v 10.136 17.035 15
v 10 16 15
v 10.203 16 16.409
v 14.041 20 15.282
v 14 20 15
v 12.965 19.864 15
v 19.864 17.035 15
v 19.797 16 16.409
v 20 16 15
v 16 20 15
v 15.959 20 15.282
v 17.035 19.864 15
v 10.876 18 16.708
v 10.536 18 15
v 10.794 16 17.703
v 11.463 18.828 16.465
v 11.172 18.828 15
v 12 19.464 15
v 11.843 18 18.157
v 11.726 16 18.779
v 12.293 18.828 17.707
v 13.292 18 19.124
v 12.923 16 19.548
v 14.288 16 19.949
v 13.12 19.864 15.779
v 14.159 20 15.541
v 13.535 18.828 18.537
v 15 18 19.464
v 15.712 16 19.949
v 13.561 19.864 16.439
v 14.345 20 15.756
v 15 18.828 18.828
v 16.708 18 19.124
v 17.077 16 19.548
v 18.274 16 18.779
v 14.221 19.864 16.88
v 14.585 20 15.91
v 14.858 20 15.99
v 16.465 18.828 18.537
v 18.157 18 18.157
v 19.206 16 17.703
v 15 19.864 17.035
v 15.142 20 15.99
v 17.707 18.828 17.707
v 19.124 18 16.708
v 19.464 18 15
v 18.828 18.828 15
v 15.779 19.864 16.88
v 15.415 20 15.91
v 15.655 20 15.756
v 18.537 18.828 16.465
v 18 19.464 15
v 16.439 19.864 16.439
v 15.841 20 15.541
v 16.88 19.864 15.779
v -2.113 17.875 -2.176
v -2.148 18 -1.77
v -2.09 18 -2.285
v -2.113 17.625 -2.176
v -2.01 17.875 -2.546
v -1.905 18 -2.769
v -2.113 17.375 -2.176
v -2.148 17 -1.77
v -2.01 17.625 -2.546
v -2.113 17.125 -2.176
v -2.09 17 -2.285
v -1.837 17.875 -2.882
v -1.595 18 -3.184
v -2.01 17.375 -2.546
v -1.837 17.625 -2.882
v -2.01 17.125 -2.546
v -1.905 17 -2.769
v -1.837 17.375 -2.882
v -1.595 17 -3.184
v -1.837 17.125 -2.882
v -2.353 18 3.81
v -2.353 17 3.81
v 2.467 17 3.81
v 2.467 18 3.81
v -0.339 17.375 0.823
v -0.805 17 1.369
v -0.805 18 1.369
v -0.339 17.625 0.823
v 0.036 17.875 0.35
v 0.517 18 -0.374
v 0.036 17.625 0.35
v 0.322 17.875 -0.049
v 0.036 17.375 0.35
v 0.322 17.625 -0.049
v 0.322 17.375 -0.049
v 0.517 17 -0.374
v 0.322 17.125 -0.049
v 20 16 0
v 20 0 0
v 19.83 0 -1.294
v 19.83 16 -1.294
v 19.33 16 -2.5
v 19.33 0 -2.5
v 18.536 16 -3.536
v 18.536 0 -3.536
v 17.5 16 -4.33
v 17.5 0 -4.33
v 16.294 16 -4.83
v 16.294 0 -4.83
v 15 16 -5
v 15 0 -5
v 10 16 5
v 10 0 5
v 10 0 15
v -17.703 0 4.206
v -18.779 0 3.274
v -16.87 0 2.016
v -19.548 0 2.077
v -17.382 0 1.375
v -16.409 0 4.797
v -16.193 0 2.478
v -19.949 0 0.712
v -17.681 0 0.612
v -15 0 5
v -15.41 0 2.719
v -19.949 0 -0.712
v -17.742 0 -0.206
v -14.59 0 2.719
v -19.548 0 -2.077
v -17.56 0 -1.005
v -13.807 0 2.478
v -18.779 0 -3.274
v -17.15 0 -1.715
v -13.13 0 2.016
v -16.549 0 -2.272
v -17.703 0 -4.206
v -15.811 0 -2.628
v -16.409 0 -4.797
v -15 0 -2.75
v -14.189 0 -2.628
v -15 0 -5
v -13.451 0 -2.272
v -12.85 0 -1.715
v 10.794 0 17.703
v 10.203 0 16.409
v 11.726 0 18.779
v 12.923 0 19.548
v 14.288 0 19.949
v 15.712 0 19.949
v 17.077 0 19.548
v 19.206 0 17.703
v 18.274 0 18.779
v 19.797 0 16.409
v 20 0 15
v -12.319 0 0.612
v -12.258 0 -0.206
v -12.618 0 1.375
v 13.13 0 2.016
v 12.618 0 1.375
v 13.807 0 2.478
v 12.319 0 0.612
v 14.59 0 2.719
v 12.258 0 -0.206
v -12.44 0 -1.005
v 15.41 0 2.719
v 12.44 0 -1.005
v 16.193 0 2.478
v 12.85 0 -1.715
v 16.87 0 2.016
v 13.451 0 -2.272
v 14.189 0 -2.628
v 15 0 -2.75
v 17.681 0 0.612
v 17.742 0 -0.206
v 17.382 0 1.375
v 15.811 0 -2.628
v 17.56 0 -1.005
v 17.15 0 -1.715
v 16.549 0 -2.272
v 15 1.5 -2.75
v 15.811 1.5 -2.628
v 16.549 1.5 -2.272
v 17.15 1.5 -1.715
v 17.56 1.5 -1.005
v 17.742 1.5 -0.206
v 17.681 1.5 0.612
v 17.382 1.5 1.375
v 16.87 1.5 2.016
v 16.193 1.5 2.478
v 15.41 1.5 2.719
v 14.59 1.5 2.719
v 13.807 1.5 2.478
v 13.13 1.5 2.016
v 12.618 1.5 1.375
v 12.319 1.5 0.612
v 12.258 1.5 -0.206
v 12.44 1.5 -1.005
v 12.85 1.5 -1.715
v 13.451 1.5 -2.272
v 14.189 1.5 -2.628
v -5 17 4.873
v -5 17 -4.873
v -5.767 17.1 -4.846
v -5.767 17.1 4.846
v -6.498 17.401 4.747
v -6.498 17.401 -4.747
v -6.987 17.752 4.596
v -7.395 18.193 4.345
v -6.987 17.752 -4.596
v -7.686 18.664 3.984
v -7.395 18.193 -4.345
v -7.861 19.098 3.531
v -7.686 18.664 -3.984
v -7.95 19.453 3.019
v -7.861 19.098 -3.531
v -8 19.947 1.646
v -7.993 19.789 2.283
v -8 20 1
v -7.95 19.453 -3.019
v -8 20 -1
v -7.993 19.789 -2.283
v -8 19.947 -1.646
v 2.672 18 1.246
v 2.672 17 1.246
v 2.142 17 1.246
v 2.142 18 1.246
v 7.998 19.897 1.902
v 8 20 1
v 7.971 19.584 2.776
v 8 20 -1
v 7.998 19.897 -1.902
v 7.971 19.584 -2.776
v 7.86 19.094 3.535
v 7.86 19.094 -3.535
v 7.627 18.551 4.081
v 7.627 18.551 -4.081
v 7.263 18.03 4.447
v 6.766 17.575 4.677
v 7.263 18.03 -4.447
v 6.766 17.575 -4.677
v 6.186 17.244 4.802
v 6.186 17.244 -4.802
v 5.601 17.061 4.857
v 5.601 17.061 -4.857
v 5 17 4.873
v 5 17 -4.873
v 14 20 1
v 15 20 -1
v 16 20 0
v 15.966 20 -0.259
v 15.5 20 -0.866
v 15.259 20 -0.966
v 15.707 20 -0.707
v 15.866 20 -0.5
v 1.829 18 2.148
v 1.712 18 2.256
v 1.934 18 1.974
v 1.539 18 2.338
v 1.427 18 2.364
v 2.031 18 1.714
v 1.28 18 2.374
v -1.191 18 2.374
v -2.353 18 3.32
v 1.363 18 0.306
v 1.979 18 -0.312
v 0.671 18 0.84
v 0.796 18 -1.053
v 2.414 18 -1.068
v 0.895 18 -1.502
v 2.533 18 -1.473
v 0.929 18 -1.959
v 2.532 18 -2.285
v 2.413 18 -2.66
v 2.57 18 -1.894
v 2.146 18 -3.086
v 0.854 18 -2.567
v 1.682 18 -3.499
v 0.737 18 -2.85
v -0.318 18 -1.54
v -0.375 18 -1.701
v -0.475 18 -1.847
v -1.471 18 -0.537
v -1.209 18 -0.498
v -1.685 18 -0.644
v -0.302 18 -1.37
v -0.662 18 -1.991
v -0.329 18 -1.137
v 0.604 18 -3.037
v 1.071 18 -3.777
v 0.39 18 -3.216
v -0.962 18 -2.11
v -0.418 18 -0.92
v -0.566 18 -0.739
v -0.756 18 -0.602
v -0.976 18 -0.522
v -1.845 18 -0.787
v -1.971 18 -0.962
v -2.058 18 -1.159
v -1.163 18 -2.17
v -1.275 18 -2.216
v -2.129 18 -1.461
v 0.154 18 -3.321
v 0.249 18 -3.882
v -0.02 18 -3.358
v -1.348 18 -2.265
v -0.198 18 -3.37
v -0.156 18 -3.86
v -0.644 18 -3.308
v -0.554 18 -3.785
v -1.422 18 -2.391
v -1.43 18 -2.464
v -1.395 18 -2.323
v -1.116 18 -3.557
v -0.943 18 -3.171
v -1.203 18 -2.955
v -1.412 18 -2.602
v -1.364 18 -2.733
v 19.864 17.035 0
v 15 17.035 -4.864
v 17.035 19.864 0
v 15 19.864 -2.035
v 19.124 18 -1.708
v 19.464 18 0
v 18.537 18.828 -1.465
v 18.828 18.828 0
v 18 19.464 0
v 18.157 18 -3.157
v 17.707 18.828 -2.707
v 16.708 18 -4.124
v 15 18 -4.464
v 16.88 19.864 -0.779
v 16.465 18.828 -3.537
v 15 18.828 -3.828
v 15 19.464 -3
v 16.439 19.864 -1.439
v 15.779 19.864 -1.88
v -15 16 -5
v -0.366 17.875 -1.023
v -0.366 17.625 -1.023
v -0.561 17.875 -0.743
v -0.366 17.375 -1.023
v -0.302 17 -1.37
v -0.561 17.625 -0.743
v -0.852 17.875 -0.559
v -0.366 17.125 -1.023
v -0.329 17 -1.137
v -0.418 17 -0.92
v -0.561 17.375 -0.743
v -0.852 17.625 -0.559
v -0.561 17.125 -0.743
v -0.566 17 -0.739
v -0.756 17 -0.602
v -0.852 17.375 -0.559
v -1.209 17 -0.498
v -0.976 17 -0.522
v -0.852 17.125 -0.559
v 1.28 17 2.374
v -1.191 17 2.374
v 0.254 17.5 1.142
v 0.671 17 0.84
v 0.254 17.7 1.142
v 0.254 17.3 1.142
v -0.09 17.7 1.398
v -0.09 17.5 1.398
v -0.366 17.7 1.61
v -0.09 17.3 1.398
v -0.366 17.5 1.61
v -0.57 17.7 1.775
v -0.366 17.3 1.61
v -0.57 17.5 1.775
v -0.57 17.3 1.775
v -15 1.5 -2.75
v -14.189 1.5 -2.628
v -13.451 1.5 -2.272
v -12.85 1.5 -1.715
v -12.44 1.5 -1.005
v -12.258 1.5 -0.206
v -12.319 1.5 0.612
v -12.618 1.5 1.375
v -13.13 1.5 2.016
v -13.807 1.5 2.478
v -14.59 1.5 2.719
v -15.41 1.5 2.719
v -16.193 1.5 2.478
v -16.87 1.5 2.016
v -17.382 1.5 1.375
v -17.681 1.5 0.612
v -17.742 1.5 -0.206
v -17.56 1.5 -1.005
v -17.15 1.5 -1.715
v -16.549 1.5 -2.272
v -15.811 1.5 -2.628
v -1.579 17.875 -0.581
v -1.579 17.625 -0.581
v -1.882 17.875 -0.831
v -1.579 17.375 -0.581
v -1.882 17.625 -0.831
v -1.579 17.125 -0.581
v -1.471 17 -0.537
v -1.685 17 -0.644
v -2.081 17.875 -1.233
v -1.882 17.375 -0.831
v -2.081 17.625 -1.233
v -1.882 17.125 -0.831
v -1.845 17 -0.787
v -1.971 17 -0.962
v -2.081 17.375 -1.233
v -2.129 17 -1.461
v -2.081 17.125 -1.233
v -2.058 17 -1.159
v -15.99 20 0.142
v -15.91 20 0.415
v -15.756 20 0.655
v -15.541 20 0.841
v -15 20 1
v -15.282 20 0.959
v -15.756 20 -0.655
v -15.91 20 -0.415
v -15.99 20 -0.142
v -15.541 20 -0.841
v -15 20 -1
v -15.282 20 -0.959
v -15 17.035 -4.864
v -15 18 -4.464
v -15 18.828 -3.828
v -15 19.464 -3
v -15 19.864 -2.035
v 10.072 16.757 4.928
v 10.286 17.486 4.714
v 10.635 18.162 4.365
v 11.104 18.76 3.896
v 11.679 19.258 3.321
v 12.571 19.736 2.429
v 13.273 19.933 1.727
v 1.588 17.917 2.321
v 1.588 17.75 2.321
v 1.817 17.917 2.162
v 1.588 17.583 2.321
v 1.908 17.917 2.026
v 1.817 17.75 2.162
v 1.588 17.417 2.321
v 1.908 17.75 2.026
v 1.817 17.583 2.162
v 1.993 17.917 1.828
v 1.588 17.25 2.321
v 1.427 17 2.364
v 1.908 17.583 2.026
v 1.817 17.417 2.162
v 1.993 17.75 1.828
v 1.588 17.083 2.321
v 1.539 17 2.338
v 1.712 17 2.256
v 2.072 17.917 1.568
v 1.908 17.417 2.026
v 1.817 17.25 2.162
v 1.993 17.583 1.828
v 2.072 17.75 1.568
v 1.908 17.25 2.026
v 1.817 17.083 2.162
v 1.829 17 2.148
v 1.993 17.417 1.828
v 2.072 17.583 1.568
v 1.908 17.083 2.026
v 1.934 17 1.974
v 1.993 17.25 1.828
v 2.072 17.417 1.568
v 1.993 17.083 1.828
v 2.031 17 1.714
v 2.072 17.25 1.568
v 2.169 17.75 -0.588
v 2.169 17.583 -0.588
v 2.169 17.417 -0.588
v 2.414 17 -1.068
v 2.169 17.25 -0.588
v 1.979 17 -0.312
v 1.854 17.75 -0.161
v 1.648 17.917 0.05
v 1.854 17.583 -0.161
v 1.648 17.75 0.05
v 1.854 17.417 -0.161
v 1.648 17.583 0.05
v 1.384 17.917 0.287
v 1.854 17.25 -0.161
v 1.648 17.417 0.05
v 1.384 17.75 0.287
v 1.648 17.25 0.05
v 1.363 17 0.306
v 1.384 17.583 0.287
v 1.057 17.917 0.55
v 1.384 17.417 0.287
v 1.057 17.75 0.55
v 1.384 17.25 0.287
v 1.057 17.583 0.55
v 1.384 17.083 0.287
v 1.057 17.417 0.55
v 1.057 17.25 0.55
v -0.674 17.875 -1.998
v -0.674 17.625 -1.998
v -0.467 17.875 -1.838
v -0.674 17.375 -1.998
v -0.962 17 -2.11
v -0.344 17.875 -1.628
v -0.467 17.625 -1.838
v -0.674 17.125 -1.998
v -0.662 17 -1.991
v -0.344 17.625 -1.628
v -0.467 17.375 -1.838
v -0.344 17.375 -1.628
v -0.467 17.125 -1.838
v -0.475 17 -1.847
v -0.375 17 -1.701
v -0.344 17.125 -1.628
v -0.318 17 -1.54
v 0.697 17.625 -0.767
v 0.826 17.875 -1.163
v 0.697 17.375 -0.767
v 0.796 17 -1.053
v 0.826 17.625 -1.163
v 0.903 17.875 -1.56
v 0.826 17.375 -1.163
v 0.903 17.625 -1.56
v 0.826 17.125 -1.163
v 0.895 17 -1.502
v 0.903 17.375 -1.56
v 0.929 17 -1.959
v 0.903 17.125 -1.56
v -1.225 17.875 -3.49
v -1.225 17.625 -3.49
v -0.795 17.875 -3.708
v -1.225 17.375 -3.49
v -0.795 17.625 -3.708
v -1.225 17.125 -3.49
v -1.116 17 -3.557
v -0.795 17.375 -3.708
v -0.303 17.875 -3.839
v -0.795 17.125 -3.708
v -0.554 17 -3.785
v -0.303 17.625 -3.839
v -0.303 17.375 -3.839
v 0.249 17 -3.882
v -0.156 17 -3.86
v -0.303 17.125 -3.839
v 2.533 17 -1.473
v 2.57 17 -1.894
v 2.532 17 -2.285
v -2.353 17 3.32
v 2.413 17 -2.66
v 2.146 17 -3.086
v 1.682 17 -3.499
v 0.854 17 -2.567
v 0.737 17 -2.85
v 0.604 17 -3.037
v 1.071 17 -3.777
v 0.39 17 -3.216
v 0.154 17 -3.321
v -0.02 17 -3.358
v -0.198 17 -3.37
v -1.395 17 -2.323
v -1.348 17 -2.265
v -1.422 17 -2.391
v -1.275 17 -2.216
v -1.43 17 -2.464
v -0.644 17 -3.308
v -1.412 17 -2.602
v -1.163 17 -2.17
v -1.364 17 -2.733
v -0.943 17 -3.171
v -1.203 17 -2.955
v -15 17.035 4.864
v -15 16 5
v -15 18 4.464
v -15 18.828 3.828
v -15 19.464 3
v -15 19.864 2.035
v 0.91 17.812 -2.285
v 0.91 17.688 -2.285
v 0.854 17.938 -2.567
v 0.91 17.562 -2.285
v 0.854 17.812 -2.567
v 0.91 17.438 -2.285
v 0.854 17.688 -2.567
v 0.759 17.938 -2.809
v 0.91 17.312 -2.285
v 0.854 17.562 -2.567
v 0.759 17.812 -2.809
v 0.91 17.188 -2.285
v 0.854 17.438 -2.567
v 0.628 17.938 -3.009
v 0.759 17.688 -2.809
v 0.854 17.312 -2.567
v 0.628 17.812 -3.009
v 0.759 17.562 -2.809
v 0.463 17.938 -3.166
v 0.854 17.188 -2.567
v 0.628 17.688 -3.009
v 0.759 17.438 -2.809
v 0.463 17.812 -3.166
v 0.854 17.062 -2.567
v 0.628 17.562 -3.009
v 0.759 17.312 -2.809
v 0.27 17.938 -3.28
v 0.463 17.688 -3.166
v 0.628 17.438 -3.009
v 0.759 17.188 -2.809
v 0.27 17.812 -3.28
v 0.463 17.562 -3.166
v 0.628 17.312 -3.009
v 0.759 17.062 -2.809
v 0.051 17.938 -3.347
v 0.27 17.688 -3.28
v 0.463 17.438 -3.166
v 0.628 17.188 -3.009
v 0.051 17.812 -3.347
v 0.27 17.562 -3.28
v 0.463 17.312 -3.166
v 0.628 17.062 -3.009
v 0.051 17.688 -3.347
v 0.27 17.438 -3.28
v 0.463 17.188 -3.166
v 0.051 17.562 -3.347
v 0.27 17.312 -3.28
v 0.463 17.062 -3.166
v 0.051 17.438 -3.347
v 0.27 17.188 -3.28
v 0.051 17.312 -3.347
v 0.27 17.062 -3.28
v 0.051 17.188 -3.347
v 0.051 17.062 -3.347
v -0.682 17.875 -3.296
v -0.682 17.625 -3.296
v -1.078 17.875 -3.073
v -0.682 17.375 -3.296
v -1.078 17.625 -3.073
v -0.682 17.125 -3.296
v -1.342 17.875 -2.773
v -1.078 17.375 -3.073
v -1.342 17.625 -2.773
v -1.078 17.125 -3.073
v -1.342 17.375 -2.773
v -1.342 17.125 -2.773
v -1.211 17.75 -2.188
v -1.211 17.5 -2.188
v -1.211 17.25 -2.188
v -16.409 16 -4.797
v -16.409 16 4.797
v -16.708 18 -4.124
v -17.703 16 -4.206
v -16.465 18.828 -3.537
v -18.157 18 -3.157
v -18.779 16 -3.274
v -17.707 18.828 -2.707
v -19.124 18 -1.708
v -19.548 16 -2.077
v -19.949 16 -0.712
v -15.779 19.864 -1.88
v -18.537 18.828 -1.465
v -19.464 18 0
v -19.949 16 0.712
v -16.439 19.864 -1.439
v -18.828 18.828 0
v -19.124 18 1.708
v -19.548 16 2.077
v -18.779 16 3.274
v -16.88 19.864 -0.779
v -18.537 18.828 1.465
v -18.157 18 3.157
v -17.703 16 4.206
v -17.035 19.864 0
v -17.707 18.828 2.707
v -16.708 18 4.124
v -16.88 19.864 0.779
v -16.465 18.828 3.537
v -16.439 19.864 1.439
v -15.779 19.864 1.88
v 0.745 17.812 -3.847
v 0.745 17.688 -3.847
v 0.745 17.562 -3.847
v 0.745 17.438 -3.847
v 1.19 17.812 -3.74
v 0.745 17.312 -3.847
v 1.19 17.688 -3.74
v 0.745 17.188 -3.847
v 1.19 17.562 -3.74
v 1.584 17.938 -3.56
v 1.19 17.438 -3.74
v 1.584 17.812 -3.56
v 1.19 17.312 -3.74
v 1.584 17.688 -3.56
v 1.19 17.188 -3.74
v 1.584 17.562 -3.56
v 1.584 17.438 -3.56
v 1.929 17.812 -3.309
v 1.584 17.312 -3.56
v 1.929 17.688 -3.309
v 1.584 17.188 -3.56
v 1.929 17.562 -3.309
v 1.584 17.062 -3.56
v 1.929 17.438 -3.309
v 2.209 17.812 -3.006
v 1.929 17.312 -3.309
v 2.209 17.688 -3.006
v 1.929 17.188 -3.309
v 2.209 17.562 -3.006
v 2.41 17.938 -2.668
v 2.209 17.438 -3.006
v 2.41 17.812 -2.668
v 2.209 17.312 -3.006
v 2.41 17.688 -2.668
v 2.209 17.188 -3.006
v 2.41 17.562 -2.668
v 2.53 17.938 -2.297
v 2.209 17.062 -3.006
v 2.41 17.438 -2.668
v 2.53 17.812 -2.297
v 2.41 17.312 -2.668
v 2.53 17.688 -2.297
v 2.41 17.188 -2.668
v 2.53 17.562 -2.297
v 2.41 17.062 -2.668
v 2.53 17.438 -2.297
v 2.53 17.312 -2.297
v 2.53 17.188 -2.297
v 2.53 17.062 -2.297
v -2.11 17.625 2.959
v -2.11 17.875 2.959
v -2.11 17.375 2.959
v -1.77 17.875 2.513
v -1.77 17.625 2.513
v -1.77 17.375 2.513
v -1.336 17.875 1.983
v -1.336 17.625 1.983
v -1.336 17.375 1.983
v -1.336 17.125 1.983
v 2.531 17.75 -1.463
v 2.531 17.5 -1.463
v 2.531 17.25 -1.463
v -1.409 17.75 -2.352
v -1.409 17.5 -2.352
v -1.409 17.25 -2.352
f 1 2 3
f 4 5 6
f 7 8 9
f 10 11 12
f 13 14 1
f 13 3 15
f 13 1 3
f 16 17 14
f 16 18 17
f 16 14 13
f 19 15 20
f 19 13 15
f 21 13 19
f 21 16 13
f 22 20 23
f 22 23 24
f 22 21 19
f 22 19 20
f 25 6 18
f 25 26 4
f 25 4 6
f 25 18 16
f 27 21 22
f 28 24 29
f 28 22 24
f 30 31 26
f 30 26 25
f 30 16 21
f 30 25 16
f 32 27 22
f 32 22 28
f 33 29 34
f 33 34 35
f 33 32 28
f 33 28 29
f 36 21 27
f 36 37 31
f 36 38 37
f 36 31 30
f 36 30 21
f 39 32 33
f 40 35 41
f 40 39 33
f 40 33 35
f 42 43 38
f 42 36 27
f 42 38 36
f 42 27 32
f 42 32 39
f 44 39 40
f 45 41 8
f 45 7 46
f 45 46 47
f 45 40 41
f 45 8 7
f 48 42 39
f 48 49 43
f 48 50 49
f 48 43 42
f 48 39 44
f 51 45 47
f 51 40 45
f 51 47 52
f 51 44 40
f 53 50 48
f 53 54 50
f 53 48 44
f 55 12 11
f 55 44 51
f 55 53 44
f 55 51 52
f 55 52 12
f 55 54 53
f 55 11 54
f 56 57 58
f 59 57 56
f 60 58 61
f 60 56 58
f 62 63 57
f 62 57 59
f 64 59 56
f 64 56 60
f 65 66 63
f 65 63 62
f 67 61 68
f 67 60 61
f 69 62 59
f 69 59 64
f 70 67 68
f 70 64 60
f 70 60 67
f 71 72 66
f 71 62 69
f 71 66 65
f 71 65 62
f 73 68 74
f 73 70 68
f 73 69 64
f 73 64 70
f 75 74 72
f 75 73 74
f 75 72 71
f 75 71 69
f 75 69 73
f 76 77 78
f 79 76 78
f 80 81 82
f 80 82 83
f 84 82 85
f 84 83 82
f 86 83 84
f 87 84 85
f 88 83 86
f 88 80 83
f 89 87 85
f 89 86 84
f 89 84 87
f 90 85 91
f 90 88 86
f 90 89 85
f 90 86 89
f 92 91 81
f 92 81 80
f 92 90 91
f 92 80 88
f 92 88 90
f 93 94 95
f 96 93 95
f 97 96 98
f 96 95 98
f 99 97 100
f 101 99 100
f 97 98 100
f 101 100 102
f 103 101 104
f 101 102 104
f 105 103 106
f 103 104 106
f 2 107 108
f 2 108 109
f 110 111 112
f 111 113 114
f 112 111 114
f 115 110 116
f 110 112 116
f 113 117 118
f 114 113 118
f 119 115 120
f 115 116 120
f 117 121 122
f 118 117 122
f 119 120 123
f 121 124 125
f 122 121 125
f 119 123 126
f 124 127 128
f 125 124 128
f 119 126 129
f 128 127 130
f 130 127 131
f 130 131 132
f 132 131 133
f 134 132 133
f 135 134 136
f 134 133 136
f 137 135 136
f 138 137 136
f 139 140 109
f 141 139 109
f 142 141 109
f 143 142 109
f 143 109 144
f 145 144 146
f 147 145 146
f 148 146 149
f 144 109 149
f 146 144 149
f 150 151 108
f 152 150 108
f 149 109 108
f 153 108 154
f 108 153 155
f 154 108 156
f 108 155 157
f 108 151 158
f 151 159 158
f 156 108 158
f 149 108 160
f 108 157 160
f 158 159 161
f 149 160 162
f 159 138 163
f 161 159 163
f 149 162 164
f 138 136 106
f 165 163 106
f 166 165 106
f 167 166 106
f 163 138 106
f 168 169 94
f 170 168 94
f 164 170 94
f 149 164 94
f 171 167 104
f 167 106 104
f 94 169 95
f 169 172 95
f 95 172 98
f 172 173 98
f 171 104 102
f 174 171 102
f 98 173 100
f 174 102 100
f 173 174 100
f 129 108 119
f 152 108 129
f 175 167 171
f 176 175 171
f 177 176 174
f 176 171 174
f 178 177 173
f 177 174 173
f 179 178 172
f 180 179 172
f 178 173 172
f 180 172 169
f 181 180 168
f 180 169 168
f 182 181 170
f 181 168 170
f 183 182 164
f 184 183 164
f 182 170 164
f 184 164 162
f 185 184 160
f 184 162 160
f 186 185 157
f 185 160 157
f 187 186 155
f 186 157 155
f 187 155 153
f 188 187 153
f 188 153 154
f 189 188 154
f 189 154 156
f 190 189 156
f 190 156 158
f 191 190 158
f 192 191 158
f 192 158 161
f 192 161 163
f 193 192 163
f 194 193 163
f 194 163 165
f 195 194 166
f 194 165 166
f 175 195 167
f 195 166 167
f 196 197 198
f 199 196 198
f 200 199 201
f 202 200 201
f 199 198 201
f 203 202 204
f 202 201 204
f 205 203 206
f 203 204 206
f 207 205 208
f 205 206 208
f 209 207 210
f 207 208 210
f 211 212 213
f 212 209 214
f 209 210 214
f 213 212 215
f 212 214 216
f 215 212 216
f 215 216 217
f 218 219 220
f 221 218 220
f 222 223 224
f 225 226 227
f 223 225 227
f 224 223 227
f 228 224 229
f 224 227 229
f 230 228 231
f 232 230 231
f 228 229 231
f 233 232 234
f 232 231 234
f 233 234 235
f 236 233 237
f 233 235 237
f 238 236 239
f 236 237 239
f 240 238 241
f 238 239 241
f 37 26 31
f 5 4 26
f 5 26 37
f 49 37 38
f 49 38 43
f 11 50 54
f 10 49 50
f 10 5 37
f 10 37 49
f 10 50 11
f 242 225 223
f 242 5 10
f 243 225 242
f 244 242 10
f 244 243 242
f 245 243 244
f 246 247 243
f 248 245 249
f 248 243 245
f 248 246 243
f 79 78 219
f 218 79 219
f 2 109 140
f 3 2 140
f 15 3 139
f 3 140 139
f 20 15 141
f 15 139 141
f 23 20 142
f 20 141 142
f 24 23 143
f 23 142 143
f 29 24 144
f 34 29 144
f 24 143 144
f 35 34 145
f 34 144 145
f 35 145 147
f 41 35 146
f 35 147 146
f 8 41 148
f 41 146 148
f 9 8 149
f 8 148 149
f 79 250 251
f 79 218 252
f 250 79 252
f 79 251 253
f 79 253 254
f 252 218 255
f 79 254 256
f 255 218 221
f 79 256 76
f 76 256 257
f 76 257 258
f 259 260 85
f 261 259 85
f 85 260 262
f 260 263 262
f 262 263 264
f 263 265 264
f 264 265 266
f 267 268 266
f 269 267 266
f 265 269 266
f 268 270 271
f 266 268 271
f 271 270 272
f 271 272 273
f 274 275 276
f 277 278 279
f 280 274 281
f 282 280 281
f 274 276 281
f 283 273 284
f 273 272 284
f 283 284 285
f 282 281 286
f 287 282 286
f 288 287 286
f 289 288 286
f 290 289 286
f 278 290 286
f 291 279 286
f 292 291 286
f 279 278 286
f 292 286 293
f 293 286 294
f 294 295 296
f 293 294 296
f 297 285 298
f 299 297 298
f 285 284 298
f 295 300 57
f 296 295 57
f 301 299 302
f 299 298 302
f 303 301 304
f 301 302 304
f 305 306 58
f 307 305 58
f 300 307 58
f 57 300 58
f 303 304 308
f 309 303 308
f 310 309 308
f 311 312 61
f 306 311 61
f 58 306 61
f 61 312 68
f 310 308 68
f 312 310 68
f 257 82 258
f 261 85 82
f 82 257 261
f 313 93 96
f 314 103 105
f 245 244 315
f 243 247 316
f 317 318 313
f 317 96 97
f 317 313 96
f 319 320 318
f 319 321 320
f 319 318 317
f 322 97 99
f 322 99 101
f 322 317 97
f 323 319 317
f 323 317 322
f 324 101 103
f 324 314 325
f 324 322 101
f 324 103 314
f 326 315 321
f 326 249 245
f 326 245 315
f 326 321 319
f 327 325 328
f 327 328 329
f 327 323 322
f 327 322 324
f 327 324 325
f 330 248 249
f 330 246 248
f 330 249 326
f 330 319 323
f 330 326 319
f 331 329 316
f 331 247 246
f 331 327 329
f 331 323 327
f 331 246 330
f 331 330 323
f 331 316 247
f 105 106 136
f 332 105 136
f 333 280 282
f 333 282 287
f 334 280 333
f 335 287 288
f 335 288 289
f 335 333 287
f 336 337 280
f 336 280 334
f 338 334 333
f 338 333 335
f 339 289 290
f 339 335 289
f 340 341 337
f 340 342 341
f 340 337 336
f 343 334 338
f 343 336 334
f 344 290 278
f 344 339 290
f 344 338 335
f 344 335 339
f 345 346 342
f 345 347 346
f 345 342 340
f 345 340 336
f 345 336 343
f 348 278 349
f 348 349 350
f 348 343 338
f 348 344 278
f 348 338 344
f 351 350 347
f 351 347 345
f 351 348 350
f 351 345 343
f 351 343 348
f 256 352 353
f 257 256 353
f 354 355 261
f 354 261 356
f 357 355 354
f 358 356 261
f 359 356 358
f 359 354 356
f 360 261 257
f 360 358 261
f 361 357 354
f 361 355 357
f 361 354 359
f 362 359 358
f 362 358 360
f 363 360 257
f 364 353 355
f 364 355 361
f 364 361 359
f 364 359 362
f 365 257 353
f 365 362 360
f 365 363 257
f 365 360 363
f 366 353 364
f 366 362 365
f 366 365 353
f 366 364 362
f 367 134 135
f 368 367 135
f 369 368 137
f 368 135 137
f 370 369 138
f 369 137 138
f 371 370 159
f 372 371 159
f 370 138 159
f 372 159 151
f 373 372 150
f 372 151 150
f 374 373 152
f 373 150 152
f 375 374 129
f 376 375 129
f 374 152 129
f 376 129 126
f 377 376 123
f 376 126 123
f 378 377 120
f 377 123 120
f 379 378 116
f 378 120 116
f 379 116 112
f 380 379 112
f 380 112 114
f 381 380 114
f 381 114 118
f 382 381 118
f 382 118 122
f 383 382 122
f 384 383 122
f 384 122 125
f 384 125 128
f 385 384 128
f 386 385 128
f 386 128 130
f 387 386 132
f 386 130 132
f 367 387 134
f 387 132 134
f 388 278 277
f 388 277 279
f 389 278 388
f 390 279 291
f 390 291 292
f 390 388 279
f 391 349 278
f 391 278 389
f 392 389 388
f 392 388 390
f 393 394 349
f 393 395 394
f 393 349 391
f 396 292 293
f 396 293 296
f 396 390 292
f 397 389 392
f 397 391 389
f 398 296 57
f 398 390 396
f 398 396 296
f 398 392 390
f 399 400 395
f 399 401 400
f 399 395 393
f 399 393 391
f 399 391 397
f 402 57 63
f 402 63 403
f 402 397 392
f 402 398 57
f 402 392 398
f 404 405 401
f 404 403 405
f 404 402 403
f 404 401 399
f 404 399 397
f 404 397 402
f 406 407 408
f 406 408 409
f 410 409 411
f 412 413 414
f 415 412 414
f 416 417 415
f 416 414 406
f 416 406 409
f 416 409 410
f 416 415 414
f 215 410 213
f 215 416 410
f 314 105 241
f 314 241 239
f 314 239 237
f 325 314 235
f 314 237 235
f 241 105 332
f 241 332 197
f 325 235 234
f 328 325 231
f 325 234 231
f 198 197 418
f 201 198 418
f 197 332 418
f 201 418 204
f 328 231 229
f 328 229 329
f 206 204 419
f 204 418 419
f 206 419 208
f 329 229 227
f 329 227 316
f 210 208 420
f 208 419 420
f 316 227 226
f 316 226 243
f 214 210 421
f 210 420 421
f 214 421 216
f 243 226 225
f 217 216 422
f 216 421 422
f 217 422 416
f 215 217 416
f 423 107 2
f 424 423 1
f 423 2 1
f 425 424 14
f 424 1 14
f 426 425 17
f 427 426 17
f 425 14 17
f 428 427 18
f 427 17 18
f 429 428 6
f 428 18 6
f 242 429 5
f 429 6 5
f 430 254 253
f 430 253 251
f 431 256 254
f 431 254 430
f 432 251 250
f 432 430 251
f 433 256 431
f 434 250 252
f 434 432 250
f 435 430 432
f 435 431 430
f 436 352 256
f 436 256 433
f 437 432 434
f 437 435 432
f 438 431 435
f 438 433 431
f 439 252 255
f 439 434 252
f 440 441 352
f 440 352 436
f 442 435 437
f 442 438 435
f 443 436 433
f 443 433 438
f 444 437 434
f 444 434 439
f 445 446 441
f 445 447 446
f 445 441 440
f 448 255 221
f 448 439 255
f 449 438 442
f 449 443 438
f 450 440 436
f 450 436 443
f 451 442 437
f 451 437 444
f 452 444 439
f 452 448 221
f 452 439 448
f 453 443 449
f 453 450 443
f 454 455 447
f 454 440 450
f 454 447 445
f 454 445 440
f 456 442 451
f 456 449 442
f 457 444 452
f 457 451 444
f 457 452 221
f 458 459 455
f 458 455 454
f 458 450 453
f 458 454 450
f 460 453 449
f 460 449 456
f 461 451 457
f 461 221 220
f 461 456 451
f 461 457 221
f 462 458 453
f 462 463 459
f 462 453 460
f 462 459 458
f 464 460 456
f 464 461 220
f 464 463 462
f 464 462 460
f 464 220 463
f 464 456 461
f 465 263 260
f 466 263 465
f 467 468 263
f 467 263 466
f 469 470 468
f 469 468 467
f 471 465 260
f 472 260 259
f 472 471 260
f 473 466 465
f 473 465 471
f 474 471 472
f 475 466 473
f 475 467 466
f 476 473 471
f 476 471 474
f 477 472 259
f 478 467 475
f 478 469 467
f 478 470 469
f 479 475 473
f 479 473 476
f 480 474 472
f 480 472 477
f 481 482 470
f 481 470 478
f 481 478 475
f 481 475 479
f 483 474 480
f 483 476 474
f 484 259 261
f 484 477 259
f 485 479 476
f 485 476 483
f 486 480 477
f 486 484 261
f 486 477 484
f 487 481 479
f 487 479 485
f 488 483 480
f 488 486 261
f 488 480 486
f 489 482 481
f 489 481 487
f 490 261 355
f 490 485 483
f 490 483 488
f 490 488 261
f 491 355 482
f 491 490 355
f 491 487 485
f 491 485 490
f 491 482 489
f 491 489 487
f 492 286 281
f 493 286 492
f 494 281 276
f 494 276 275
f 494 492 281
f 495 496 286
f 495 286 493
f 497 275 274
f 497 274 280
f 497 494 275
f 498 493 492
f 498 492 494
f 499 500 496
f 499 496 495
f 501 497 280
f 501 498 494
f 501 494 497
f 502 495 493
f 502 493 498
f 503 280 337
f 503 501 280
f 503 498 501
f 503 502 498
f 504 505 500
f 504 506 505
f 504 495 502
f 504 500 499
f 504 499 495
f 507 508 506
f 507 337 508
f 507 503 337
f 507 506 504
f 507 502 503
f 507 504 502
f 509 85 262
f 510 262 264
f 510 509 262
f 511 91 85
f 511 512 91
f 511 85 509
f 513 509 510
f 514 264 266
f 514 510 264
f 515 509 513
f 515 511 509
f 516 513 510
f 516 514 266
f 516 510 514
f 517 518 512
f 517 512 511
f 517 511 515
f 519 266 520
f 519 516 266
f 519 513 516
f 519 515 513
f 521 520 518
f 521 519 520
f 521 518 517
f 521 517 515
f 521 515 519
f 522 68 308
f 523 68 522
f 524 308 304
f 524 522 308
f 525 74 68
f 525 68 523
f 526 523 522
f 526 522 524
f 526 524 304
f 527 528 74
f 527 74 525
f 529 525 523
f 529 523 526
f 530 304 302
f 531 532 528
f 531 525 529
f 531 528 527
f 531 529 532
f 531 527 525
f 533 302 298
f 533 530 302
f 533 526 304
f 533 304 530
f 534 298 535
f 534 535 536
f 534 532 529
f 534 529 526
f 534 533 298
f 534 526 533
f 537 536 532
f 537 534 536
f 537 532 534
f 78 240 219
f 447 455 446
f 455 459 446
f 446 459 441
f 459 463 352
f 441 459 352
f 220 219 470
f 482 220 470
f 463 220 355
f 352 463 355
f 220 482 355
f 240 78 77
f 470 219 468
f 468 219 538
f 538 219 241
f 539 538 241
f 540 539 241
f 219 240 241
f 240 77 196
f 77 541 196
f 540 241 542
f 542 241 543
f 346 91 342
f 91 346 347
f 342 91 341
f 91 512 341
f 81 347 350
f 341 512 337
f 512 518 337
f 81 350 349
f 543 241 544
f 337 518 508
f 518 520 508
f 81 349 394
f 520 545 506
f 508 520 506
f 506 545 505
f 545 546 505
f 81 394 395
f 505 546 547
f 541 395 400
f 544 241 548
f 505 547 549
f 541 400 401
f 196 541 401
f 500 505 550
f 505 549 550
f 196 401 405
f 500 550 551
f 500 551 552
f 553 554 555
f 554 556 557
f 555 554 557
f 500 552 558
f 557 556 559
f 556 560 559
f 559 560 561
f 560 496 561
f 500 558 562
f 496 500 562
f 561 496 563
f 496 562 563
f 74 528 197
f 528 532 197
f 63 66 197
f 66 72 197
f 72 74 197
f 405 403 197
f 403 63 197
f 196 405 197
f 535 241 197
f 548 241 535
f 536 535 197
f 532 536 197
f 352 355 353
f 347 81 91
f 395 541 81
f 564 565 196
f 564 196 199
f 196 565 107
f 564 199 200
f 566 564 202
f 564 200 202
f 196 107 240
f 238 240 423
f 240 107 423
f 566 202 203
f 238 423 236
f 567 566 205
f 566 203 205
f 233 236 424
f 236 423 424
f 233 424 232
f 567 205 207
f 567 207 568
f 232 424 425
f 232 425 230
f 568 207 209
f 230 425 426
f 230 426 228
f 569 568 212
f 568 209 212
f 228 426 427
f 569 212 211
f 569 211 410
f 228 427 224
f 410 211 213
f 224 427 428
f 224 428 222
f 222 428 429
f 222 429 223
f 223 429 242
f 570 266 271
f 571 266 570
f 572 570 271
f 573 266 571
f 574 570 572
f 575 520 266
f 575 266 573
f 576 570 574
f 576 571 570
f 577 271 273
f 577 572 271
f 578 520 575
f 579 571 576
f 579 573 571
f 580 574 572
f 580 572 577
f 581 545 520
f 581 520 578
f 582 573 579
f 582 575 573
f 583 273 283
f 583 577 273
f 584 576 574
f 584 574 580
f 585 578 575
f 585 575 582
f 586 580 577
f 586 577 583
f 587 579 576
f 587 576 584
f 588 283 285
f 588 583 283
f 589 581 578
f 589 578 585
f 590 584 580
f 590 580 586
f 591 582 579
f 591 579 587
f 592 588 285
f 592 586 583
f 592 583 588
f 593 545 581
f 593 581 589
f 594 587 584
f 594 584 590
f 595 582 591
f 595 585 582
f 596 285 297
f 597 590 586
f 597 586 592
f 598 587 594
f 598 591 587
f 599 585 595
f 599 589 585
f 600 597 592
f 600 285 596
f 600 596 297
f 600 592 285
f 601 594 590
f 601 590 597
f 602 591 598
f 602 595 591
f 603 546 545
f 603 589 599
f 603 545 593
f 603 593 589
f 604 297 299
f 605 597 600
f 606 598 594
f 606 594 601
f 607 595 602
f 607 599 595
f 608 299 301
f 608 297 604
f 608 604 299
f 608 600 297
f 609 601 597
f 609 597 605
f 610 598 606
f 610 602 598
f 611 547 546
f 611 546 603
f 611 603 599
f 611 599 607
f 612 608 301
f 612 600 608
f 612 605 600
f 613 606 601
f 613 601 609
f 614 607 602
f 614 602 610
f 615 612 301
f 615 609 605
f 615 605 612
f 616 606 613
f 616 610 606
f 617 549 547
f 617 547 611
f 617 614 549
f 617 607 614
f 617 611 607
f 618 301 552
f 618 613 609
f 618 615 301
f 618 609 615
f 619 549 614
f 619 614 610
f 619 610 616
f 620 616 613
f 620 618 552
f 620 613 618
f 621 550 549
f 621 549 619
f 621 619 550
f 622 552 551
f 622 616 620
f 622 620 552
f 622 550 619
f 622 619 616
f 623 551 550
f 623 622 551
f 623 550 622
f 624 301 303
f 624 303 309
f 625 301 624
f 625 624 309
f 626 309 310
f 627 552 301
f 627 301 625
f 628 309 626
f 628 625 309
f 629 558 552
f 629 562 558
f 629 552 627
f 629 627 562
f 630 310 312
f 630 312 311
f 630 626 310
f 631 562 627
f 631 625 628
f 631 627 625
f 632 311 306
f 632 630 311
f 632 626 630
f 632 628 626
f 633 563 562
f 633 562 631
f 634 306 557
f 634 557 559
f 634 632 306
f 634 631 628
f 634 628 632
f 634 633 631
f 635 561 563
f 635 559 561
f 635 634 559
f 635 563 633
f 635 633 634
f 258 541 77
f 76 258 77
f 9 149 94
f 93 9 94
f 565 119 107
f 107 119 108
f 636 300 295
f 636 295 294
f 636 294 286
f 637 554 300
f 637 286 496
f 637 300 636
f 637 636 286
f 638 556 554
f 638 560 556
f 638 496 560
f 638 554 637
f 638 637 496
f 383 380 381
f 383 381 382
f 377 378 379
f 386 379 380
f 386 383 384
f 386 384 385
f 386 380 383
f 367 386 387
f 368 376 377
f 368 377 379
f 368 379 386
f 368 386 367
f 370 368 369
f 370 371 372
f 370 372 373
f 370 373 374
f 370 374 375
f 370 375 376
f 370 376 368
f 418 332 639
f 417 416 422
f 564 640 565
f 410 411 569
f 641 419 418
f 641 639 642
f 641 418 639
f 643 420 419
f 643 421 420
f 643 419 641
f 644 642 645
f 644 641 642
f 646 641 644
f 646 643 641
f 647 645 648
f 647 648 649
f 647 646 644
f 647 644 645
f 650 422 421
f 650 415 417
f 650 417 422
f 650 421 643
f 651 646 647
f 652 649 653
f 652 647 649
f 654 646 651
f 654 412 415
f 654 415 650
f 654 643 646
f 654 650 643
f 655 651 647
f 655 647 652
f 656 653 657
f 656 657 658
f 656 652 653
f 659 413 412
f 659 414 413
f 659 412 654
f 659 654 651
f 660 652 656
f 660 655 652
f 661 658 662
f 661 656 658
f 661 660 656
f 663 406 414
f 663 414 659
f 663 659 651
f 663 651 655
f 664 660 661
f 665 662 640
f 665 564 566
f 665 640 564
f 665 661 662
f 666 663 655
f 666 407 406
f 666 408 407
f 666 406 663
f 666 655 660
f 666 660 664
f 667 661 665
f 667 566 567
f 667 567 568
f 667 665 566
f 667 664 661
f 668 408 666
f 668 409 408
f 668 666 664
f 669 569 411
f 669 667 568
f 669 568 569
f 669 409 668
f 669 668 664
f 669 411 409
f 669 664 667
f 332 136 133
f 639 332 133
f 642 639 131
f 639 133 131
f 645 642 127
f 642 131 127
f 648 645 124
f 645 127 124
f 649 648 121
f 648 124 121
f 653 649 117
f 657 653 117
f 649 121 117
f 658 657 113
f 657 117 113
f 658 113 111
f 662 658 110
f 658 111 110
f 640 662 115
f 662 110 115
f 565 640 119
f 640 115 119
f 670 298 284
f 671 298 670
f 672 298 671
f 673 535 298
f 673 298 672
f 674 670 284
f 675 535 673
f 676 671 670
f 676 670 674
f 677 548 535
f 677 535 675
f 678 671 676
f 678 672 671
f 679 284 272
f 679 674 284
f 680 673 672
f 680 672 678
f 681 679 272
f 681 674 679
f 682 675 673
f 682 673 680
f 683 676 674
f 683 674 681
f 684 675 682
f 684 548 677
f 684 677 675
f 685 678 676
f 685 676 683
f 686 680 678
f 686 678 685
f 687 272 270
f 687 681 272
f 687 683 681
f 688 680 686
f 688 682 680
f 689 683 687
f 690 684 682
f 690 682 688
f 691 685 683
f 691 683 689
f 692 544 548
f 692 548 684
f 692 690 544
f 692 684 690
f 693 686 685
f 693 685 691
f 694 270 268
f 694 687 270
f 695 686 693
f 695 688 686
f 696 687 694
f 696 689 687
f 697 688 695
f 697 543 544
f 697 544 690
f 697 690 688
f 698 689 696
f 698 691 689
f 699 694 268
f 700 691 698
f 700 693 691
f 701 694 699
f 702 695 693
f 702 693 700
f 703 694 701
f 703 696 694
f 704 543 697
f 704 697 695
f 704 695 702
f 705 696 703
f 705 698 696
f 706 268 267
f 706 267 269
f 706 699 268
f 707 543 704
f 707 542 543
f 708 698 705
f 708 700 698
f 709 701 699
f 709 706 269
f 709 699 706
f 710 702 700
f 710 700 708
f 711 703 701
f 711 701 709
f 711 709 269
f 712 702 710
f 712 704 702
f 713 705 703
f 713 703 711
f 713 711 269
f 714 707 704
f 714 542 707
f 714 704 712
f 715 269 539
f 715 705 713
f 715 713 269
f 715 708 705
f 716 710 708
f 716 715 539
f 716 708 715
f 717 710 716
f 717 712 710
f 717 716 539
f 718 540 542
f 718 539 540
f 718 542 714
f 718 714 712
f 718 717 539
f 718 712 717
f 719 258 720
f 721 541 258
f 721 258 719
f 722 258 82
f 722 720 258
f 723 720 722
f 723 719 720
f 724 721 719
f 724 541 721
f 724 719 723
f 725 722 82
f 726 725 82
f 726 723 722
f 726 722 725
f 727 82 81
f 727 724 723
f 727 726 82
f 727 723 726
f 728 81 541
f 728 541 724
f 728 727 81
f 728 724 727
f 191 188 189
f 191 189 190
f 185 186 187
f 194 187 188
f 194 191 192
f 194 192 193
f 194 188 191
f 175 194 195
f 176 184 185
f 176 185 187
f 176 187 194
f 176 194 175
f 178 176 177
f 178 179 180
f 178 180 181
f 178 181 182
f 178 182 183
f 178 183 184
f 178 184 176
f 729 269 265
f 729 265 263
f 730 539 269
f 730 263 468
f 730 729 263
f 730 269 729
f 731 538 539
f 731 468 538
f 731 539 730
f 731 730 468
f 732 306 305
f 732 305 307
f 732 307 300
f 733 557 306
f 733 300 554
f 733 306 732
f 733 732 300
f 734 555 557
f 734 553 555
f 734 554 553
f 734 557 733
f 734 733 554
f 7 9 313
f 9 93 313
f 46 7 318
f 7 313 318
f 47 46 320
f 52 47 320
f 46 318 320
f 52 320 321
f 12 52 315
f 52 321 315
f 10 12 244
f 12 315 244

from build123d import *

# Parameters (mm, degrees)
BOSS_EXTRUDE1_DEPTH     = 20
FILLET1_R               = 4
SKETCH2_R               = 2.75
CUT_EXTRUDE1_DEPTH      = 1.5
LPATTERN1_COUNT         = 2
LPATTERN1_PITCH         = 30
CUT_EXTRUDE2_DEPTH      = 35.641016151
CUT_EXTRUDE2_DEPTH_BACK = 35.641016151
WRAP1_DEPTH             = 1


# Read off the part's stored shape, not the designer's step: Wrap1
with BuildPart() as part:
    # Sketch1 → Boss-Extrude1 (new body)
    with BuildSketch(Plane(origin=(0, 0, 0), x_dir=(1, 0, 0), z_dir=(0, 1, 0))):
        with BuildLine():
            Line((-15, -5), (10, -5))
            Line((10, -5), (10, -15))
            ThreePointArc((10, -15), (15, -20), (20, -15))
            Line((20, -15), (20, 0))
            ThreePointArc((20, 0), (18.535533906, 3.535533906), (15, 5))
            Line((15, 5), (-15, 5))
            ThreePointArc((-15, 5), (-20, 0), (-15, -5))
        make_face()
    extrude(amount=BOSS_EXTRUDE1_DEPTH)

    # Fillet1
    fillet1_edges = [part.edges().sort_by_distance(p)[0] for p in [
        (15, 20, 20),
        (20, 20, 7.5),
        (18.535533906, 20, -3.535533906),
        (0, 20, -5),
        (-20, 20, 0),
        (-2.5, 20, 5),
        (10, 20, 10),
    ]]
    fillet(fillet1_edges, radius=FILLET1_R)

    # Sketch2 → Cut-Extrude1 (cut)
    with BuildSketch(Plane.XZ):
        with Locations(Location((-15, 0, 0), (0, 0, 270))):
            Circle(SKETCH2_R)
    cut_extrude1 = extrude(amount=-CUT_EXTRUDE1_DEPTH, mode=Mode.SUBTRACT)

    # LPattern1: Cut-Extrude1 ×2
    with Locations(*[(i * LPATTERN1_PITCH, 0, 0) for i in range(1, LPATTERN1_COUNT)]):
        add(cut_extrude1, mode=Mode.SUBTRACT)

    # Sketch3 → Cut-Extrude2 (cut, two sides: drawn at the far end of the back side and taken through both)
    with BuildSketch(Plane.XY.offset(-CUT_EXTRUDE2_DEPTH_BACK)):
        with BuildLine():
            Line((5, 17), (-5, 17))
            ThreePointArc((-5, 17), (-8, 20), (-5, 23))
            Line((-5, 23), (5, 23))
            ThreePointArc((5, 23), (8, 20), (5, 17))
        make_face()
    extrude(amount=CUT_EXTRUDE2_DEPTH + CUT_EXTRUDE2_DEPTH_BACK, mode=Mode.SUBTRACT)

    # Wrap1 outline → Wrap1 (add)
    with BuildSketch(Plane(origin=(0, 17, 0), x_dir=(1, 0, 0), z_dir=(0, 1, 0))):
        with BuildLine():
            add(Edge.make_bspline(
                [(1.279846376, -2.374028678), (1.334628235, -2.372005919), (1.439423638, -2.368136466), (1.586709387, -2.326690884), (1.715405832, -2.260778282), (1.805401117, -2.180421216), (1.866547055, -2.099402851), (1.91146986, -2.023004422), (1.954343809, -1.931092566), (1.995394653, -1.823787438), (2.03540343, -1.701296934), (2.074075054, -1.563508285), (2.108116131, -1.409568974), (2.130405187, -1.301938193), (2.142025864, -1.245823549)],
                knots=[0, 0, 0, 0, 0.10403341, 0.199011557, 0.288612319, 0.377191825, 0.425797175, 0.481425289, 0.545557079, 0.61863331, 0.699984683, 0.790771883, 0.890916323, 1, 1, 1, 1], degree=3))
            Line((1.279846376, -2.374028678), (-1.19130747, -2.374028678))
            add(Edge.make_bspline(
                [(0.670872017, -0.840374831), (0.598877184, -0.892890897), (0.460407765, -0.993896327), (0.259247648, -1.136582046), (0.079136214, -1.2721954), (-0.085697103, -1.393939001), (-0.231791362, -1.50542791), (-0.360742391, -1.605057789), (-0.471476435, -1.693040171), (-0.650584686, -1.841423278), (-0.895932385, -2.060152678), (-1.093407848, -2.269997081), (-1.19130747, -2.374028678)],
                knots=[0, 0, 0, 0, 0.110593572, 0.212707314, 0.306051588, 0.390379305, 0.467018215, 0.534117187, 0.592614819, 0.642525788, 0.822780058, 1, 1, 1, 1], degree=3))
            add(Edge.make_bspline(
                [(2.414461761, 1.068279015), (2.378068935, 0.984722167), (2.306117333, 0.819523423), (2.171764082, 0.586037142), (2.024257932, 0.364395962), (1.882362056, 0.191285153), (1.756342108, 0.053944192), (1.645356158, -0.054277839), (1.52024596, -0.169630314), (1.380454268, -0.29172845), (1.224880603, -0.419904333), (1.052848506, -0.553709461), (0.868059484, -0.696771215), (0.737896342, -0.79156374), (0.670872017, -0.840374831)],
                knots=[0, 0, 0, 0, 0.10413489, 0.205883221, 0.307528832, 0.408265615, 0.461433854, 0.520606469, 0.585444086, 0.656004792, 0.732803839, 0.815893726, 0.905198979, 1, 1, 1, 1], degree=3))
            add(Edge.make_bspline(
                [(2.569910479, 1.893599528), (2.568142746, 1.81978224), (2.56468278, 1.675300383), (2.535113724, 1.46316539), (2.486055205, 1.260681768), (2.438163447, 1.131975763), (2.414461761, 1.068279015)],
                knots=[0, 0, 0, 0, 0.261979501, 0.512769921, 0.758869279, 1, 1, 1, 1], degree=3))
            add(Edge.make_bspline(
                [(0.249397658, 3.882381579), (0.333852401, 3.880295856), (0.499413602, 3.876207099), (0.741908223, 3.851223526), (0.971759136, 3.80593405), (1.18959295, 3.744264137), (1.393306246, 3.661376278), (1.586046869, 3.564171248), (1.76456817, 3.445680325), (1.930217215, 3.311921517), (2.08021151, 3.165619914), (2.21133761, 3.008910571), (2.322587283, 2.843726724), (2.412544984, 2.66919338), (2.484129314, 2.487396013), (2.533041577, 2.296802227), (2.565160525, 2.098215825), (2.568307798, 1.962639068), (2.569910479, 1.893599528)],
                knots=[0, 0, 0, 0, 0.074102612, 0.14526736, 0.21355926, 0.279416432, 0.343556942, 0.406228654, 0.468492489, 0.531146675, 0.592790073, 0.652016559, 0.710119813, 0.767135501, 0.823967905, 0.881147087, 0.939476717, 1, 1, 1, 1], degree=3))
            add(Edge.make_bspline(
                [(-1.595153624, 3.18366363), (-1.537018416, 3.239488538), (-1.421267077, 3.350639908), (-1.227322021, 3.49323037), (-1.01917847, 3.614849236), (-0.794503481, 3.712369576), (-0.555192573, 3.789539817), (-0.300158666, 3.843743016), (-0.03027423, 3.875864088), (0.154757504, 3.880176079), (0.249397658, 3.882381579)],
                knots=[0, 0, 0, 0, 0.119107626, 0.23715177, 0.355050392, 0.47498588, 0.598670295, 0.726365388, 0.860041186, 1, 1, 1, 1], degree=3))
            add(Edge.make_bspline(
                [(-2.148038239, 1.770202092), (-2.146834557, 1.839213319), (-2.1444639, 1.975131192), (-2.115761448, 2.174024084), (-2.0725438, 2.364349945), (-2.013797101, 2.547053872), (-1.93451202, 2.719957511), (-1.839205925, 2.884783326), (-1.727409324, 3.041427104), (-1.639506749, 3.135963346), (-1.595153624, 3.18366363)],
                knots=[0, 0, 0, 0, 0.132803649, 0.26155729, 0.386082589, 0.508400008, 0.630401232, 0.751619273, 0.874674186, 1, 1, 1, 1], degree=3))
            add(Edge.make_bspline(
                [(-1.208935675, 0.497766194), (-1.274132827, 0.50149434), (-1.401855252, 0.508797847), (-1.58379437, 0.575310486), (-1.747403804, 0.682290997), (-1.890553306, 0.830420443), (-2.008834141, 1.01608116), (-2.088271481, 1.239599951), (-2.141324633, 1.493680029), (-2.145722196, 1.674808207), (-2.148038239, 1.770202092)],
                knots=[0, 0, 0, 0, 0.110139331, 0.215764983, 0.323707128, 0.438906263, 0.562183724, 0.693638164, 0.838649921, 1, 1, 1, 1], degree=3))
            add(Edge.make_bspline(
                [(-0.301884393, 1.369561066), (-0.304766572, 1.30886225), (-0.310374385, 1.190761489), (-0.360035913, 1.021550791), (-0.443342029, 0.869740737), (-0.557930256, 0.738678363), (-0.695194398, 0.631756347), (-0.851287883, 0.551805139), (-1.025431534, 0.507328091), (-1.146729825, 0.50100757), (-1.208935675, 0.497766194)],
                knots=[0, 0, 0, 0, 0.129242333, 0.251464839, 0.372304265, 0.495878621, 0.620081591, 0.741344555, 0.867352775, 1, 1, 1, 1], degree=3))
            add(Edge.make_bspline(
                [(-0.962140803, 2.109945681), (-0.909824085, 2.094806974), (-0.81039346, 2.066035077), (-0.675027986, 2.002430367), (-0.560830979, 1.92712373), (-0.46427764, 1.841406615), (-0.391475884, 1.740340724), (-0.339690156, 1.627067557), (-0.306087178, 1.502350913), (-0.303311641, 1.414655948), (-0.301884393, 1.369561066)],
                knots=[0, 0, 0, 0, 0.151156851, 0.287281401, 0.413669873, 0.530293514, 0.644009236, 0.756908248, 0.874996313, 1, 1, 1, 1], degree=3))
            add(Edge.make_bspline(
                [(-1.348358752, 2.265394399), (-1.330621209, 2.251855949), (-1.288474303, 2.219686679), (-1.202511656, 2.184828621), (-1.092623552, 2.143667428), (-1.00837918, 2.121895451), (-0.962140803, 2.109945681)],
                knots=[0, 0, 0, 0, 0.159109439, 0.378066483, 0.65864549, 1, 1, 1, 1], degree=3))
            add(Edge.make_bspline(
                [(-1.430089521, 2.464112348), (-1.429415195, 2.444204185), (-1.428114492, 2.405803442), (-1.411058666, 2.351977791), (-1.385555484, 2.303870537), (-1.360780125, 2.278243013), (-1.348358752, 2.265394399)],
                knots=[0, 0, 0, 0, 0.268945253, 0.518766978, 0.758729042, 1, 1, 1, 1], degree=3))
            add(Edge.make_bspline(
                [(-0.197717726, 3.369561066), (-0.28241452, 3.365853817), (-0.446198046, 3.358684877), (-0.681222607, 3.303774927), (-0.893632691, 3.209273649), (-1.077682983, 3.0804735), (-1.229219898, 2.93431847), (-1.344105461, 2.782798304), (-1.415738038, 2.624883436), (-1.425407352, 2.516563894), (-1.430089521, 2.464112348)],
                knots=[0, 0, 0, 0, 0.151816317, 0.293576777, 0.429964406, 0.566304914, 0.694365033, 0.806085808, 0.906100976, 1, 1, 1, 1], degree=3))
            add(Edge.make_bspline(
                [(0.928884838, 1.959304656), (0.928086086, 2.015438052), (0.926539001, 2.124161628), (0.911151444, 2.281372808), (0.890291843, 2.428618132), (0.855346146, 2.564724047), (0.815441285, 2.692385245), (0.761060485, 2.807885158), (0.701186968, 2.914806673), (0.629381656, 3.009462922), (0.551801509, 3.095312), (0.463668068, 3.167247991), (0.370794497, 3.230338766), (0.271044111, 3.28236916), (0.163381009, 3.320276983), (0.04991907, 3.349915646), (-0.071775658, 3.365230608), (-0.154947449, 3.36809043), (-0.197717726, 3.369561066)],
                knots=[0, 0, 0, 0, 0.082284271, 0.159374645, 0.231497254, 0.300083139, 0.36523236, 0.427274673, 0.486932074, 0.544586116, 0.60112786, 0.656190593, 0.710940404, 0.765594865, 0.820607428, 0.877984079, 0.93725451, 1, 1, 1, 1], degree=3))
            add(Edge.make_bspline(
                [(0.517025864, 0.374368758), (0.549928586, 0.43914421), (0.615149426, 0.567544204), (0.697152899, 0.765273295), (0.770951673, 0.962291119), (0.827867417, 1.161343452), (0.873192914, 1.360332754), (0.905111682, 1.559455639), (0.92522592, 1.759102273), (0.927663621, 1.892484206), (0.928884838, 1.959304656)],
                knots=[0, 0, 0, 0, 0.131745637, 0.261150462, 0.388067803, 0.513189353, 0.636374668, 0.758087597, 0.878808958, 1, 1, 1, 1], degree=3))
            add(Edge.make_bspline(
                [(-0.805089521, -1.369220985), (-0.723674568, -1.275391825), (-0.566728304, -1.09451429), (-0.344338673, -0.83116064), (-0.144847313, -0.585533161), (0.031128622, -0.358191092), (0.186040311, -0.149965293), (0.317060652, 0.040597284), (0.427968481, 0.211694057), (0.488762816, 0.322742687), (0.517025864, 0.374368758)],
                knots=[0, 0, 0, 0, 0.170005554, 0.327725258, 0.471696803, 0.603008639, 0.721148947, 0.826797124, 0.919478664, 1, 1, 1, 1], degree=3))
            add(Edge.make_bspline(
                [(-2.353166444, -3.319541498), (-2.317411217, -3.262535334), (-2.240300808, -3.139594747), (-2.103504918, -2.950449774), (-1.948026633, -2.736340024), (-1.76326396, -2.505230848), (-1.559031147, -2.249795036), (-1.329305353, -1.9745526), (-1.076183846, -1.67797272), (-0.897762158, -1.474766675), (-0.805089521, -1.369220985)],
                knots=[0, 0, 0, 0, 0.080973991, 0.174630064, 0.280853316, 0.39944862, 0.530692677, 0.674513651, 0.830941638, 1, 1, 1, 1], degree=3))
            Line((-2.353166444, -3.319541498), (-2.353166444, -3.809926113))
            Line((-2.353166444, -3.809926113), (2.467346376, -3.809926113))
            Line((2.467346376, -3.809926113), (2.672474581, -1.245823549))
            Line((2.672474581, -1.245823549), (2.142025864, -1.245823549))
        make_face()
    extrude(amount=WRAP1_DEPTH)


solid = part.part
